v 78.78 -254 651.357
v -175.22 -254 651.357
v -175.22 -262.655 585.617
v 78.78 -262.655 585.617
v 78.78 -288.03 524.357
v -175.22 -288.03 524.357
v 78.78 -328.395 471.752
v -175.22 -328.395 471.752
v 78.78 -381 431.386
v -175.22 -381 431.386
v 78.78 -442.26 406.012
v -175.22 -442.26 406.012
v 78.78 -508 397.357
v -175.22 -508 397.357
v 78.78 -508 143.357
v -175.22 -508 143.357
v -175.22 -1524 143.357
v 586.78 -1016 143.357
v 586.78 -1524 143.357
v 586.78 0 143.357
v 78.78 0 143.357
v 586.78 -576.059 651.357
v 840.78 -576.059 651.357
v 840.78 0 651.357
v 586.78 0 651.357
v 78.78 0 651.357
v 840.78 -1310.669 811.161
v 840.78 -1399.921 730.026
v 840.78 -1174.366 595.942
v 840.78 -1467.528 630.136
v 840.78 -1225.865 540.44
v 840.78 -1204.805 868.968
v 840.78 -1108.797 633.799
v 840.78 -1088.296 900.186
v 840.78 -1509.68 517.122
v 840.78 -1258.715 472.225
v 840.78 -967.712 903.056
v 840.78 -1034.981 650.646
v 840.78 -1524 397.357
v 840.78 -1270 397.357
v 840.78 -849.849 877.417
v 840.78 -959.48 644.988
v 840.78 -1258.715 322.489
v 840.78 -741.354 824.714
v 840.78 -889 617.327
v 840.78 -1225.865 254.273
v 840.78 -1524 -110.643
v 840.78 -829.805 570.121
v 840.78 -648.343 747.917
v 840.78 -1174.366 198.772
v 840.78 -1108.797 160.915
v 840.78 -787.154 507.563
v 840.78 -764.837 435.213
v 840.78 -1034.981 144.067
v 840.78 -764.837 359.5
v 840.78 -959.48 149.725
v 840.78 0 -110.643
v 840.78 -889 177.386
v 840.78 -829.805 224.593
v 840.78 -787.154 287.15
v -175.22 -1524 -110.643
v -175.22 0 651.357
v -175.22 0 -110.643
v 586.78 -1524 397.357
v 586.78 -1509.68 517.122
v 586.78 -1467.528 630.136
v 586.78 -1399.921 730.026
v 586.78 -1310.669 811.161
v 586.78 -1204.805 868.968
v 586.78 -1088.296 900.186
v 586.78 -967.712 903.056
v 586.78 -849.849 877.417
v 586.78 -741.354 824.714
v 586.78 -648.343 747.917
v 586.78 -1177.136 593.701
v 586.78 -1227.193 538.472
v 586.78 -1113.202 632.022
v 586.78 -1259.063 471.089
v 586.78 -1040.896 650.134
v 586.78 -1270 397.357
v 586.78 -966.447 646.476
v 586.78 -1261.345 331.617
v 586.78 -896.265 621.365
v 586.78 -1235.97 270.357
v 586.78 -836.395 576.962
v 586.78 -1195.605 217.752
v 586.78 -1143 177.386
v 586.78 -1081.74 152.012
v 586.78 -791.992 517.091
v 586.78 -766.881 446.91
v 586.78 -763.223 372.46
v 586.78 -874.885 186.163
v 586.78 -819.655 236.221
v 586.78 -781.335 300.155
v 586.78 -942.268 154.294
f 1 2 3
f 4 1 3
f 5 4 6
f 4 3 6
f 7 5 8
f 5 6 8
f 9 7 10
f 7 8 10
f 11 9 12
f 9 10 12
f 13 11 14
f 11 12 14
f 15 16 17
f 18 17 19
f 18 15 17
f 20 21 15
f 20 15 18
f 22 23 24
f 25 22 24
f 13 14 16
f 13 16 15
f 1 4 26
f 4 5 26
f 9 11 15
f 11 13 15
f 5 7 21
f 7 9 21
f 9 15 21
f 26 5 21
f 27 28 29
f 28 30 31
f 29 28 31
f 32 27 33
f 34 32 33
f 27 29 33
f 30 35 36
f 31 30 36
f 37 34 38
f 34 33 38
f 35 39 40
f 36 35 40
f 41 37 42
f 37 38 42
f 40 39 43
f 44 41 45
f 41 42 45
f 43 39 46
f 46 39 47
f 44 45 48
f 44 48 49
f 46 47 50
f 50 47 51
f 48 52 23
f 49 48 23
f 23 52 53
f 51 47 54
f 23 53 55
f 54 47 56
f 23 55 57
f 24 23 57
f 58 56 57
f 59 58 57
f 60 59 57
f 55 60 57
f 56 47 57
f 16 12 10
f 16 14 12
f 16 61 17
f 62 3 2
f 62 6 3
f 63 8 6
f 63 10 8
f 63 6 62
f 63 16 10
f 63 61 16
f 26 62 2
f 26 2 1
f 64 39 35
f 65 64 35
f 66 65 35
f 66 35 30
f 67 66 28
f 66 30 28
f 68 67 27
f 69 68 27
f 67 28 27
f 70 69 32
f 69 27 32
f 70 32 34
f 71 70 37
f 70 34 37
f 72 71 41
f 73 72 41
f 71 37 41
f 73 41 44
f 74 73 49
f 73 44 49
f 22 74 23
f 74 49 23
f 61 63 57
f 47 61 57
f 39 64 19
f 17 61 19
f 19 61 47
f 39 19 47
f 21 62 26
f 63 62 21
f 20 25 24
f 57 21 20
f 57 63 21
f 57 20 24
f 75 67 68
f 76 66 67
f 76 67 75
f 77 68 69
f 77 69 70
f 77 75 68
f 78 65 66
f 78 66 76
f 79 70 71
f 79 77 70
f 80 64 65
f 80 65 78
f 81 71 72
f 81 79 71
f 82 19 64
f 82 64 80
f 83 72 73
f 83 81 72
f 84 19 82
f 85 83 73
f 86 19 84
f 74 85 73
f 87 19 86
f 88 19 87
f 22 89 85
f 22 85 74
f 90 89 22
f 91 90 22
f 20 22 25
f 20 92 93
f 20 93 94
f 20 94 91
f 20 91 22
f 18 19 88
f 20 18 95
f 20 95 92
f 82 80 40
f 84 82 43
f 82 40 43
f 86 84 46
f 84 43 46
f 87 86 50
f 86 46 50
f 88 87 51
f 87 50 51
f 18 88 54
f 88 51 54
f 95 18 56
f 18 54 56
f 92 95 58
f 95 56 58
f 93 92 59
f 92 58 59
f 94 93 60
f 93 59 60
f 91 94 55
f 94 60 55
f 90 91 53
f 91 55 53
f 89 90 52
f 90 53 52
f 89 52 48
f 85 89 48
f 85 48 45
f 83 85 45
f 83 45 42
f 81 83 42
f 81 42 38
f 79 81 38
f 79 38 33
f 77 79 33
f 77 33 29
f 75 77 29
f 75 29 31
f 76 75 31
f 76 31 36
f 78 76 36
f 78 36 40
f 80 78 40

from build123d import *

# Parameters (mm, degrees)
F0_W      = 1016
F0_H      = 254
F1_DEPTH  = 1524
F2_W      = 254
F2_H      = 508
F3_DEPTH  = 508
F4_W      = 254
F4_H      = 1524
F5_DEPTH  = 762
F7_DEPTH  = 254
F9_DEPTH  = 254
F10_W     = 508
F10_H     = 254
F11_DEPTH = 254


with BuildPart() as f1:
    # F0 (on Front) → F1 (new body)
    with BuildSketch(Plane.XZ):
        with Locations((332.7798564441, 16.3567224517)):
            Rectangle(F0_W, F0_H)
    extrude(amount=F1_DEPTH)

    # F2 (on face) → F3 (join)
    with BuildSketch(Plane.XY.offset(143.3567224517)):
        with Locations((-48.2201435559, -254)):
            Rectangle(F2_W, F2_H)
    extrude(amount=F3_DEPTH)

    # F4 (on face) → F5 (join)
    with BuildSketch(Plane.XY.offset(143.3567224517)):
        with Locations((713.7798564441, -762)):
            Rectangle(F4_W, F4_H)
    extrude(amount=F5_DEPTH)

    # F6 (on face) → F7 (cut)
    with BuildSketch(Plane(origin=(-175.2201435559, 0, 0), x_dir=(0, -1, 0), z_dir=(-1, 0, 0))):
        with BuildLine():
            Line((508, 651.3567224517), (254, 651.3567224517))
            ThreePointArc((254, 651.3567224517), (328.3948775786, 471.7516000304), (508, 397.3567224517))
            Line((508, 397.3567224517), (508, 651.3567224517))
        make_face()
    extrude(amount=-F7_DEPTH, mode=Mode.SUBTRACT)

    # F8 (on face) → F9 (cut)
    with BuildSketch(Plane.YZ.offset(840.7798564441)):
        with BuildLine():
            ThreePointArc((-1016, 651.3567224517), (-1195.6051224214, 576.9618448731), (-1270, 397.3567224517))
            Line((-1270, 397.3567224517), (-1016, 397.3567224517))
            Line((-1016, 397.3567224517), (-1016, 651.3567224517))
        make_face()
        with BuildLine():
            Line((-1016, 397.3567224517), (-762, 397.3567224517))
            ThreePointArc((-762, 397.3567224517), (-836.3948775786, 576.9618448731), (-1016, 651.3567224517))
            Line((-1016, 651.3567224517), (-1016, 397.3567224517))
        make_face()
        with BuildLine():
            Line((-1016, 397.3567224517), (-1270, 397.3567224517))
            ThreePointArc((-1270, 397.3567224517), (-1016, 143.3567224517), (-762, 397.3567224517))
            Line((-762, 397.3567224517), (-1016, 397.3567224517))
        make_face()
    extrude(amount=-F9_DEPTH, mode=Mode.SUBTRACT)

    # F10 (on face) → F11 (cut)
    with BuildSketch(Plane.YZ.offset(840.7798564441)):
        with BuildLine():
            Line((-762, 397.3567224517), (-1270, 397.3567224517))
            ThreePointArc((-1270, 397.3567224517), (-1016, 143.3567224517), (-762, 397.3567224517))
        make_face()
        with BuildLine():
            ThreePointArc((-762, 397.3567224517), (-1016, 651.3567224517), (-1270, 397.3567224517))
            Line((-1270, 397.3567224517), (-762, 397.3567224517))
        make_face()
        with BuildLine():
            Line((-1524, 905.3567224517), (-1524, 397.3567224517))
            ThreePointArc((-1524, 397.3567224517), (-1375.2102448427, 756.5669672945), (-1015.9999999999, 905.3567224517))
            Line((-1015.9999999999, 905.3567224517), (-1524, 905.3567224517))
        make_face()
        with BuildLine():
            Line((-508, 905.3567224517), (-1015.9999999999, 905.3567224517))
            ThreePointArc((-1015.9999999999, 905.3567224517), (-762, 837.2976275742), (-576.0590948775, 651.3567224517))
            Line((-576.0590948775, 651.3567224517), (-508, 651.3567224517))
            Line((-508, 651.3567224517), (-508, 905.3567224517))
        make_face()
        with Locations((-254, 778.3567224517)):
            Rectangle(F10_W, F10_H)
    extrude(amount=-F11_DEPTH, mode=Mode.SUBTRACT)


solid = f1.part
